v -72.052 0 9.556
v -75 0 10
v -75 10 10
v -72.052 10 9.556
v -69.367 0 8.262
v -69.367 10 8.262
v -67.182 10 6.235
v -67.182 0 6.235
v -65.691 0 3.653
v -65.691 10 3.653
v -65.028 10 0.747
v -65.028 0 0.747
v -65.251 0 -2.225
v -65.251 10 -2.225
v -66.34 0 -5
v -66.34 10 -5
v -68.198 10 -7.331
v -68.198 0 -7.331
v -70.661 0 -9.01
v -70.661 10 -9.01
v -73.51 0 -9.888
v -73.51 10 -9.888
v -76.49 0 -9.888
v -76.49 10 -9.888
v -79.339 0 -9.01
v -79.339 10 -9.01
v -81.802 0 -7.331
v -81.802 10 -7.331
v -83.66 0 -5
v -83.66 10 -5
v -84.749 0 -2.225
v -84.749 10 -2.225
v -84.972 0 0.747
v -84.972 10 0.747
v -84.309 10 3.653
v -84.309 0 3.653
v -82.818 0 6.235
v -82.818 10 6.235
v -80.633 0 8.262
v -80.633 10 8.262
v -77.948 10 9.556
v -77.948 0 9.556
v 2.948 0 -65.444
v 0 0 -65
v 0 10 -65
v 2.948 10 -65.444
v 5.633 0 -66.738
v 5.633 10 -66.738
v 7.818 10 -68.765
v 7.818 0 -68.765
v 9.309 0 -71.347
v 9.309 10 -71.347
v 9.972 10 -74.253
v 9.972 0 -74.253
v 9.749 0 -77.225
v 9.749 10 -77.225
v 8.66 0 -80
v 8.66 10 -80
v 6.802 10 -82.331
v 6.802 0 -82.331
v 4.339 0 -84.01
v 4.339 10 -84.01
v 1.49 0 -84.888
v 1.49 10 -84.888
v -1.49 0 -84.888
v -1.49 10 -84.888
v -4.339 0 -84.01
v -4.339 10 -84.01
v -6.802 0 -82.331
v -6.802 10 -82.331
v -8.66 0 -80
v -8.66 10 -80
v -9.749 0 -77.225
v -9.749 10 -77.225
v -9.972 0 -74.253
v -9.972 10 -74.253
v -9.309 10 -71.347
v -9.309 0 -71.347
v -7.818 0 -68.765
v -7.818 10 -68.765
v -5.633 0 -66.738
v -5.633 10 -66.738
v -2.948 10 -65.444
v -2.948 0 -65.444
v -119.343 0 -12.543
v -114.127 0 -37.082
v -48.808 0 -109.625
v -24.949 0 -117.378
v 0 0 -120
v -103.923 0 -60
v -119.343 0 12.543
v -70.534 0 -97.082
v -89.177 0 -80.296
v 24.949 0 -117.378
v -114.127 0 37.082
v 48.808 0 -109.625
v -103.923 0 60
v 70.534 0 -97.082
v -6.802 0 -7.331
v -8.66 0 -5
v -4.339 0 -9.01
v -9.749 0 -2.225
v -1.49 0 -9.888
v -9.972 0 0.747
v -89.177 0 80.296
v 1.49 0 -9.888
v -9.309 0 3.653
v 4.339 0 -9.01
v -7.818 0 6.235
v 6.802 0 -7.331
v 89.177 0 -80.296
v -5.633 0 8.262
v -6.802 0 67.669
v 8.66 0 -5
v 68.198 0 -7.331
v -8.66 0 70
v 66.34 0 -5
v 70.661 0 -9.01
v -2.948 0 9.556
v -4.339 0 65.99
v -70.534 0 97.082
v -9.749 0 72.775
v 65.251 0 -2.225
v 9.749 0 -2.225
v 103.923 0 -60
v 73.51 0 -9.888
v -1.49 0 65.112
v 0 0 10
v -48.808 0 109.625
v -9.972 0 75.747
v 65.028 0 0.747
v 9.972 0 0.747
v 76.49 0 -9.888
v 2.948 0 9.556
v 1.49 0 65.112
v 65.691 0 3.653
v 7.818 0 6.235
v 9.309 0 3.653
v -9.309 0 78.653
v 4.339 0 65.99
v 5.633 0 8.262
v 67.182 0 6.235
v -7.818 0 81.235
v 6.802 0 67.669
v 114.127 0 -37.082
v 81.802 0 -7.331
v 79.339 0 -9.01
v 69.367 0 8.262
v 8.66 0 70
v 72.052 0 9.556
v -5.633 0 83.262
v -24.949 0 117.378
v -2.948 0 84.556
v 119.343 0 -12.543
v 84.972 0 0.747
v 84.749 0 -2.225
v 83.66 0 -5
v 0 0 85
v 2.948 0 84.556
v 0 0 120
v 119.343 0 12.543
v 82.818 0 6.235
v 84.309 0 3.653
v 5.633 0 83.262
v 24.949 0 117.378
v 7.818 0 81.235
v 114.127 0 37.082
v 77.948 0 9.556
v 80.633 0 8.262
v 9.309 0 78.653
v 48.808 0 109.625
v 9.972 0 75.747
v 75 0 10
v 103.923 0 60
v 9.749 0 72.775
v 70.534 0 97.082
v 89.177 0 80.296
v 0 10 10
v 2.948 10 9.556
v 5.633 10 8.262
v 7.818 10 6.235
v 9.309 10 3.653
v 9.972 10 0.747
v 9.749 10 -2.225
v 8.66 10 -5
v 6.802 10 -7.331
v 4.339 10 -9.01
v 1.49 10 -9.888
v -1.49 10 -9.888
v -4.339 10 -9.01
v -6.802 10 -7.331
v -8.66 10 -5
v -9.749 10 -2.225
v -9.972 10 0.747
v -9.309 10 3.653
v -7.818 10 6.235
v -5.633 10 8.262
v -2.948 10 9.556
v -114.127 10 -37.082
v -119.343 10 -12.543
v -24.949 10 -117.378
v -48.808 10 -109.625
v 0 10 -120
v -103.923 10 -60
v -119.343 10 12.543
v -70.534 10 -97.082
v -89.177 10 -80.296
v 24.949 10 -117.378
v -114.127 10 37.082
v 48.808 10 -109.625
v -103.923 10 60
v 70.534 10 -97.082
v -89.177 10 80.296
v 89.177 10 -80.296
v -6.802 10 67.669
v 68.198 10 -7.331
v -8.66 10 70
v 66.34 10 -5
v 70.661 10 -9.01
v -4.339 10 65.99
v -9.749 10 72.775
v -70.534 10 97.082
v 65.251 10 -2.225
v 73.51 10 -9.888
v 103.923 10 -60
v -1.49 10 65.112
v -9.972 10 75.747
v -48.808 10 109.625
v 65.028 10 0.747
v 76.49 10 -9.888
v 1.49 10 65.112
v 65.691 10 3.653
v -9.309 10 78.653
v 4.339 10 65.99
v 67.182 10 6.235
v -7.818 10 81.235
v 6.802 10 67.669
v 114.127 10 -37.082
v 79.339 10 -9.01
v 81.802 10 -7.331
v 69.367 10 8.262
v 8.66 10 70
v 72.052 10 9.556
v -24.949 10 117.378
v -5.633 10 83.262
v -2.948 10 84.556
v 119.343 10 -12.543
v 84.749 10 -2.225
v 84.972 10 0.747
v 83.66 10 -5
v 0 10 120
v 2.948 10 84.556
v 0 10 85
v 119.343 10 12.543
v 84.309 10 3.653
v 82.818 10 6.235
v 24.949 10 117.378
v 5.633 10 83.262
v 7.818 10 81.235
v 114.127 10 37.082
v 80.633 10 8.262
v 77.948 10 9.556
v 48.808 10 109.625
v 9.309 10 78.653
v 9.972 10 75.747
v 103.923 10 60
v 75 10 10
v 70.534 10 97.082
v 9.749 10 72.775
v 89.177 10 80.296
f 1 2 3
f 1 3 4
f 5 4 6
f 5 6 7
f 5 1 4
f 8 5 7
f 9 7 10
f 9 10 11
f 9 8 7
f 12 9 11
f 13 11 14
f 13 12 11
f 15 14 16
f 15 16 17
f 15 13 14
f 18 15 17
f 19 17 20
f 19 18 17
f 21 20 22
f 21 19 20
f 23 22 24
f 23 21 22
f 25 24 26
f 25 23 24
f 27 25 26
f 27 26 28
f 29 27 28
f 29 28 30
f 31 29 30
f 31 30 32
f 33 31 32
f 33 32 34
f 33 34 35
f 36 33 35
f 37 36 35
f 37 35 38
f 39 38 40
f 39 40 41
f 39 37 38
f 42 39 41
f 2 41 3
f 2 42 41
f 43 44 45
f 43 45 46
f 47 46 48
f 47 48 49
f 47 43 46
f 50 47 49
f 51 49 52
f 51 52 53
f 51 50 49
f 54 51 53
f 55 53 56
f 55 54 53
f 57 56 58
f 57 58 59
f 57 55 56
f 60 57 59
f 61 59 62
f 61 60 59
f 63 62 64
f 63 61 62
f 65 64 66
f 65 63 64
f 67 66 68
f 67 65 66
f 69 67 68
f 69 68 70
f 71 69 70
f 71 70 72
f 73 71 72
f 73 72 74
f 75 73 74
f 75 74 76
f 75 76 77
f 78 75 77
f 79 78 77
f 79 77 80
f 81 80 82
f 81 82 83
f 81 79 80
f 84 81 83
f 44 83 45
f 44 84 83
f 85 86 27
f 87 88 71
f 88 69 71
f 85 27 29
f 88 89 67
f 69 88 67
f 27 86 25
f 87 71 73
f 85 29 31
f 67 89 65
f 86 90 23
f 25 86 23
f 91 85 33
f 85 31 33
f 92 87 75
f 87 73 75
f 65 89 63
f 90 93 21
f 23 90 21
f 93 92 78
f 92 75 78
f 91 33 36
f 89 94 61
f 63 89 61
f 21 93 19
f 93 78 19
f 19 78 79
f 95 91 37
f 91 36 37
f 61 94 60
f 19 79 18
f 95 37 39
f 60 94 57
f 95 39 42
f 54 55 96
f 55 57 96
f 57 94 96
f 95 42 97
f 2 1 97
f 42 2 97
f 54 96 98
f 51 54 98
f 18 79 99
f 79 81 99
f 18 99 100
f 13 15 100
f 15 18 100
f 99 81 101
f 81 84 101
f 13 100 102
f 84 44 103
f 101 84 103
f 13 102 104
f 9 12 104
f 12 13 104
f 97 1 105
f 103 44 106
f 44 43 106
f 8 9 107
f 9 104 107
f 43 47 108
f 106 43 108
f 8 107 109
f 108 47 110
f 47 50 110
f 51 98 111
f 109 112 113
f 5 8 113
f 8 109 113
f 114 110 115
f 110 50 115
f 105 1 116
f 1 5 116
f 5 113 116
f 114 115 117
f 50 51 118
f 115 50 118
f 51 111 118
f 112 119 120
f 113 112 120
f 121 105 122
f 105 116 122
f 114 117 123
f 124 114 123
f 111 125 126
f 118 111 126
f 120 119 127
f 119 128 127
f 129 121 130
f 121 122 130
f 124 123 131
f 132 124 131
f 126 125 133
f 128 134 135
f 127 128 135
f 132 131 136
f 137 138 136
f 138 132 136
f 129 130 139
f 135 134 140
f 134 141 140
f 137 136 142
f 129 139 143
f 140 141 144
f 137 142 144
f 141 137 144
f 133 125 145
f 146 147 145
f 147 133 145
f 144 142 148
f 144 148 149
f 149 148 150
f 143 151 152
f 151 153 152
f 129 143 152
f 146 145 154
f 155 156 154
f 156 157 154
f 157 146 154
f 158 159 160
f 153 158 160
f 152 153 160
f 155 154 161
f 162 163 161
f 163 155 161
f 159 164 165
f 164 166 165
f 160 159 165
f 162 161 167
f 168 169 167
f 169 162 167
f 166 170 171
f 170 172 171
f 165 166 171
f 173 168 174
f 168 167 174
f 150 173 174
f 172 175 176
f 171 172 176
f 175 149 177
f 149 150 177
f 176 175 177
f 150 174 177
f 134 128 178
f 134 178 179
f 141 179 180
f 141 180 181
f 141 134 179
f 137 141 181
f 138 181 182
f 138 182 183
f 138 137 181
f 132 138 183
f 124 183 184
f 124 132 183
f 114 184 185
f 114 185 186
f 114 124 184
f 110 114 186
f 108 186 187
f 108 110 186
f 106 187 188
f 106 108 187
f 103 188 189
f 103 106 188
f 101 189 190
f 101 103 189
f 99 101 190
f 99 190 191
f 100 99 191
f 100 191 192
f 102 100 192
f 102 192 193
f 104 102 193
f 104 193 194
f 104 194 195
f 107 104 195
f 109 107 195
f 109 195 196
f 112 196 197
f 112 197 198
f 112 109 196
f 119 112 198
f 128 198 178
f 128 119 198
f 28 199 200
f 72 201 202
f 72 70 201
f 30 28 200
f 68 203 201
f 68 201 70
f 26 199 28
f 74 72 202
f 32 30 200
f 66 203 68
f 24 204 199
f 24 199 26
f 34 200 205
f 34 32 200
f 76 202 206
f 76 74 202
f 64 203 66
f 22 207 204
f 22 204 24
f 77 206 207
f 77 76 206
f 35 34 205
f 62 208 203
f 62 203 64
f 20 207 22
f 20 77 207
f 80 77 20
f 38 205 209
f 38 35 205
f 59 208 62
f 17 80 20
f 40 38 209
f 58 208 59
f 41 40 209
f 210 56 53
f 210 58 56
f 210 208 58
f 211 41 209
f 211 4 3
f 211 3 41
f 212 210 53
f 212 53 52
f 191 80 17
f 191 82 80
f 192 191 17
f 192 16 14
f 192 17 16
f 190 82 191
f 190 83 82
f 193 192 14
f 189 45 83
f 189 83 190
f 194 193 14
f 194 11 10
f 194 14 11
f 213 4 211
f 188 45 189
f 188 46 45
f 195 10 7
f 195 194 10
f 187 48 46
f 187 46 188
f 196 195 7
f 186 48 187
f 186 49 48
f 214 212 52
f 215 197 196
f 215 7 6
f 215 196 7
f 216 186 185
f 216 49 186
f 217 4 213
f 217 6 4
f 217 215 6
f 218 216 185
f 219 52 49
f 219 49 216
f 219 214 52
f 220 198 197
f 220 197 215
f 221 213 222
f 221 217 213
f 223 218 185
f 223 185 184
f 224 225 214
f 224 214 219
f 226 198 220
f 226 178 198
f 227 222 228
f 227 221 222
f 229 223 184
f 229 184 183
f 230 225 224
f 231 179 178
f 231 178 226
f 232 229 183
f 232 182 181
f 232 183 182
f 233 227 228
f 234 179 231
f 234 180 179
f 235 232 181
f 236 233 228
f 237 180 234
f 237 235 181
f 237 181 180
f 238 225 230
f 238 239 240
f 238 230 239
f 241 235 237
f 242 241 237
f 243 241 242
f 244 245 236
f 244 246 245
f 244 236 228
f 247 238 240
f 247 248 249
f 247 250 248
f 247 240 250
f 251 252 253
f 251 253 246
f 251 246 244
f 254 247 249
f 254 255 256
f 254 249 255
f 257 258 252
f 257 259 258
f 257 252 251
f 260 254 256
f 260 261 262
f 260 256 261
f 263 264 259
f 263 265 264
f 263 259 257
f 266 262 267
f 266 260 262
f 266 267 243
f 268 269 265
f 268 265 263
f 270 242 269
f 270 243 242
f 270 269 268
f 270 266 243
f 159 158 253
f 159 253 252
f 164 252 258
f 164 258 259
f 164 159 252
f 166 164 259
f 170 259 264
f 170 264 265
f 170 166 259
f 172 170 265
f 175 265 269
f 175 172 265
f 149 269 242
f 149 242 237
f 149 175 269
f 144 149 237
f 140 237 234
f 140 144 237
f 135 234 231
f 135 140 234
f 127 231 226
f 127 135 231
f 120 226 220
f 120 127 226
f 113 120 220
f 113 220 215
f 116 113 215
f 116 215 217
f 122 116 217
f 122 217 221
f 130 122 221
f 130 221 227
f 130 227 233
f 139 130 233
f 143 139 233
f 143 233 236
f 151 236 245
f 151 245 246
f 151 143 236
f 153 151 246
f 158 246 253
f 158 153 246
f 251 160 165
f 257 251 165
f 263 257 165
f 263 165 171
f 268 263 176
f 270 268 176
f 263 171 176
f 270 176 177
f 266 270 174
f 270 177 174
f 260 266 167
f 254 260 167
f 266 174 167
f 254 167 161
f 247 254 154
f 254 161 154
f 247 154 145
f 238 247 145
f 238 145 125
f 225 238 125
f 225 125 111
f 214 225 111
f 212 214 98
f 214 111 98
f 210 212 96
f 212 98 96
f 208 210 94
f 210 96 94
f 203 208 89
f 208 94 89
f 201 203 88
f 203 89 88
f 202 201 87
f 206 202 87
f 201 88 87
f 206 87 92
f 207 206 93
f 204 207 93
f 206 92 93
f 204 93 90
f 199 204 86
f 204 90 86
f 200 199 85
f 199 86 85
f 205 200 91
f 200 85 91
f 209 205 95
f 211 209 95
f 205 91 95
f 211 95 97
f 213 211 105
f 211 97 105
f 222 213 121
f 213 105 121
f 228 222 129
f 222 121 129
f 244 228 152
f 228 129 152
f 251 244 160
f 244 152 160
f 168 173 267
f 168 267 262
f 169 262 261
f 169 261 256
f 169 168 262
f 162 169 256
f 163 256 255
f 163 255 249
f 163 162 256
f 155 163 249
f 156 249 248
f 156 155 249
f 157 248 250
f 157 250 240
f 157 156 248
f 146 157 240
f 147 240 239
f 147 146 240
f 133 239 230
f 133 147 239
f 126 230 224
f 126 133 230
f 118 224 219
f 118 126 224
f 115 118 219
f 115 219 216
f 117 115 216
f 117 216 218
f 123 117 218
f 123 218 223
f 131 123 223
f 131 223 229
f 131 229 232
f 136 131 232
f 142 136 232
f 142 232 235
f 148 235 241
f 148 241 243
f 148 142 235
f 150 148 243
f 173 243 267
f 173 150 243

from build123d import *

# Parameters (mm, degrees)
SKETCH1_R           = 120
SKETCH1_R_2         = 10
BOSS_EXTRUDE1_DEPTH = 10


with BuildPart() as part:
    # Sketch1 → Boss-Extrude1 (new body)
    with BuildSketch(Plane(origin=(0, 0, 0), x_dir=(1, 0, 0), z_dir=(0, 1, 0))):
        with Locations(Location((0, 0, 0), (0, 0, 270))):
            Circle(SKETCH1_R)
        with Locations(Location((0, 0, 0), (0, 0, 270))):
            Circle(SKETCH1_R_2, mode=Mode.SUBTRACT)
        with Locations(Location((75, 0, 0), (0, 0, 270))):
            Circle(SKETCH1_R_2, mode=Mode.SUBTRACT)
        with Locations(Location((0, -75, 0), (0, 0, 270))):
            Circle(SKETCH1_R_2, mode=Mode.SUBTRACT)
        with Locations(Location((-75, 0, 0), (0, 0, 270))):
            Circle(SKETCH1_R_2, mode=Mode.SUBTRACT)
        with Locations(Location((0, 75, 0), (0, 0, 270))):
            Circle(SKETCH1_R_2, mode=Mode.SUBTRACT)
    extrude(amount=BOSS_EXTRUDE1_DEPTH)


solid = part.part
